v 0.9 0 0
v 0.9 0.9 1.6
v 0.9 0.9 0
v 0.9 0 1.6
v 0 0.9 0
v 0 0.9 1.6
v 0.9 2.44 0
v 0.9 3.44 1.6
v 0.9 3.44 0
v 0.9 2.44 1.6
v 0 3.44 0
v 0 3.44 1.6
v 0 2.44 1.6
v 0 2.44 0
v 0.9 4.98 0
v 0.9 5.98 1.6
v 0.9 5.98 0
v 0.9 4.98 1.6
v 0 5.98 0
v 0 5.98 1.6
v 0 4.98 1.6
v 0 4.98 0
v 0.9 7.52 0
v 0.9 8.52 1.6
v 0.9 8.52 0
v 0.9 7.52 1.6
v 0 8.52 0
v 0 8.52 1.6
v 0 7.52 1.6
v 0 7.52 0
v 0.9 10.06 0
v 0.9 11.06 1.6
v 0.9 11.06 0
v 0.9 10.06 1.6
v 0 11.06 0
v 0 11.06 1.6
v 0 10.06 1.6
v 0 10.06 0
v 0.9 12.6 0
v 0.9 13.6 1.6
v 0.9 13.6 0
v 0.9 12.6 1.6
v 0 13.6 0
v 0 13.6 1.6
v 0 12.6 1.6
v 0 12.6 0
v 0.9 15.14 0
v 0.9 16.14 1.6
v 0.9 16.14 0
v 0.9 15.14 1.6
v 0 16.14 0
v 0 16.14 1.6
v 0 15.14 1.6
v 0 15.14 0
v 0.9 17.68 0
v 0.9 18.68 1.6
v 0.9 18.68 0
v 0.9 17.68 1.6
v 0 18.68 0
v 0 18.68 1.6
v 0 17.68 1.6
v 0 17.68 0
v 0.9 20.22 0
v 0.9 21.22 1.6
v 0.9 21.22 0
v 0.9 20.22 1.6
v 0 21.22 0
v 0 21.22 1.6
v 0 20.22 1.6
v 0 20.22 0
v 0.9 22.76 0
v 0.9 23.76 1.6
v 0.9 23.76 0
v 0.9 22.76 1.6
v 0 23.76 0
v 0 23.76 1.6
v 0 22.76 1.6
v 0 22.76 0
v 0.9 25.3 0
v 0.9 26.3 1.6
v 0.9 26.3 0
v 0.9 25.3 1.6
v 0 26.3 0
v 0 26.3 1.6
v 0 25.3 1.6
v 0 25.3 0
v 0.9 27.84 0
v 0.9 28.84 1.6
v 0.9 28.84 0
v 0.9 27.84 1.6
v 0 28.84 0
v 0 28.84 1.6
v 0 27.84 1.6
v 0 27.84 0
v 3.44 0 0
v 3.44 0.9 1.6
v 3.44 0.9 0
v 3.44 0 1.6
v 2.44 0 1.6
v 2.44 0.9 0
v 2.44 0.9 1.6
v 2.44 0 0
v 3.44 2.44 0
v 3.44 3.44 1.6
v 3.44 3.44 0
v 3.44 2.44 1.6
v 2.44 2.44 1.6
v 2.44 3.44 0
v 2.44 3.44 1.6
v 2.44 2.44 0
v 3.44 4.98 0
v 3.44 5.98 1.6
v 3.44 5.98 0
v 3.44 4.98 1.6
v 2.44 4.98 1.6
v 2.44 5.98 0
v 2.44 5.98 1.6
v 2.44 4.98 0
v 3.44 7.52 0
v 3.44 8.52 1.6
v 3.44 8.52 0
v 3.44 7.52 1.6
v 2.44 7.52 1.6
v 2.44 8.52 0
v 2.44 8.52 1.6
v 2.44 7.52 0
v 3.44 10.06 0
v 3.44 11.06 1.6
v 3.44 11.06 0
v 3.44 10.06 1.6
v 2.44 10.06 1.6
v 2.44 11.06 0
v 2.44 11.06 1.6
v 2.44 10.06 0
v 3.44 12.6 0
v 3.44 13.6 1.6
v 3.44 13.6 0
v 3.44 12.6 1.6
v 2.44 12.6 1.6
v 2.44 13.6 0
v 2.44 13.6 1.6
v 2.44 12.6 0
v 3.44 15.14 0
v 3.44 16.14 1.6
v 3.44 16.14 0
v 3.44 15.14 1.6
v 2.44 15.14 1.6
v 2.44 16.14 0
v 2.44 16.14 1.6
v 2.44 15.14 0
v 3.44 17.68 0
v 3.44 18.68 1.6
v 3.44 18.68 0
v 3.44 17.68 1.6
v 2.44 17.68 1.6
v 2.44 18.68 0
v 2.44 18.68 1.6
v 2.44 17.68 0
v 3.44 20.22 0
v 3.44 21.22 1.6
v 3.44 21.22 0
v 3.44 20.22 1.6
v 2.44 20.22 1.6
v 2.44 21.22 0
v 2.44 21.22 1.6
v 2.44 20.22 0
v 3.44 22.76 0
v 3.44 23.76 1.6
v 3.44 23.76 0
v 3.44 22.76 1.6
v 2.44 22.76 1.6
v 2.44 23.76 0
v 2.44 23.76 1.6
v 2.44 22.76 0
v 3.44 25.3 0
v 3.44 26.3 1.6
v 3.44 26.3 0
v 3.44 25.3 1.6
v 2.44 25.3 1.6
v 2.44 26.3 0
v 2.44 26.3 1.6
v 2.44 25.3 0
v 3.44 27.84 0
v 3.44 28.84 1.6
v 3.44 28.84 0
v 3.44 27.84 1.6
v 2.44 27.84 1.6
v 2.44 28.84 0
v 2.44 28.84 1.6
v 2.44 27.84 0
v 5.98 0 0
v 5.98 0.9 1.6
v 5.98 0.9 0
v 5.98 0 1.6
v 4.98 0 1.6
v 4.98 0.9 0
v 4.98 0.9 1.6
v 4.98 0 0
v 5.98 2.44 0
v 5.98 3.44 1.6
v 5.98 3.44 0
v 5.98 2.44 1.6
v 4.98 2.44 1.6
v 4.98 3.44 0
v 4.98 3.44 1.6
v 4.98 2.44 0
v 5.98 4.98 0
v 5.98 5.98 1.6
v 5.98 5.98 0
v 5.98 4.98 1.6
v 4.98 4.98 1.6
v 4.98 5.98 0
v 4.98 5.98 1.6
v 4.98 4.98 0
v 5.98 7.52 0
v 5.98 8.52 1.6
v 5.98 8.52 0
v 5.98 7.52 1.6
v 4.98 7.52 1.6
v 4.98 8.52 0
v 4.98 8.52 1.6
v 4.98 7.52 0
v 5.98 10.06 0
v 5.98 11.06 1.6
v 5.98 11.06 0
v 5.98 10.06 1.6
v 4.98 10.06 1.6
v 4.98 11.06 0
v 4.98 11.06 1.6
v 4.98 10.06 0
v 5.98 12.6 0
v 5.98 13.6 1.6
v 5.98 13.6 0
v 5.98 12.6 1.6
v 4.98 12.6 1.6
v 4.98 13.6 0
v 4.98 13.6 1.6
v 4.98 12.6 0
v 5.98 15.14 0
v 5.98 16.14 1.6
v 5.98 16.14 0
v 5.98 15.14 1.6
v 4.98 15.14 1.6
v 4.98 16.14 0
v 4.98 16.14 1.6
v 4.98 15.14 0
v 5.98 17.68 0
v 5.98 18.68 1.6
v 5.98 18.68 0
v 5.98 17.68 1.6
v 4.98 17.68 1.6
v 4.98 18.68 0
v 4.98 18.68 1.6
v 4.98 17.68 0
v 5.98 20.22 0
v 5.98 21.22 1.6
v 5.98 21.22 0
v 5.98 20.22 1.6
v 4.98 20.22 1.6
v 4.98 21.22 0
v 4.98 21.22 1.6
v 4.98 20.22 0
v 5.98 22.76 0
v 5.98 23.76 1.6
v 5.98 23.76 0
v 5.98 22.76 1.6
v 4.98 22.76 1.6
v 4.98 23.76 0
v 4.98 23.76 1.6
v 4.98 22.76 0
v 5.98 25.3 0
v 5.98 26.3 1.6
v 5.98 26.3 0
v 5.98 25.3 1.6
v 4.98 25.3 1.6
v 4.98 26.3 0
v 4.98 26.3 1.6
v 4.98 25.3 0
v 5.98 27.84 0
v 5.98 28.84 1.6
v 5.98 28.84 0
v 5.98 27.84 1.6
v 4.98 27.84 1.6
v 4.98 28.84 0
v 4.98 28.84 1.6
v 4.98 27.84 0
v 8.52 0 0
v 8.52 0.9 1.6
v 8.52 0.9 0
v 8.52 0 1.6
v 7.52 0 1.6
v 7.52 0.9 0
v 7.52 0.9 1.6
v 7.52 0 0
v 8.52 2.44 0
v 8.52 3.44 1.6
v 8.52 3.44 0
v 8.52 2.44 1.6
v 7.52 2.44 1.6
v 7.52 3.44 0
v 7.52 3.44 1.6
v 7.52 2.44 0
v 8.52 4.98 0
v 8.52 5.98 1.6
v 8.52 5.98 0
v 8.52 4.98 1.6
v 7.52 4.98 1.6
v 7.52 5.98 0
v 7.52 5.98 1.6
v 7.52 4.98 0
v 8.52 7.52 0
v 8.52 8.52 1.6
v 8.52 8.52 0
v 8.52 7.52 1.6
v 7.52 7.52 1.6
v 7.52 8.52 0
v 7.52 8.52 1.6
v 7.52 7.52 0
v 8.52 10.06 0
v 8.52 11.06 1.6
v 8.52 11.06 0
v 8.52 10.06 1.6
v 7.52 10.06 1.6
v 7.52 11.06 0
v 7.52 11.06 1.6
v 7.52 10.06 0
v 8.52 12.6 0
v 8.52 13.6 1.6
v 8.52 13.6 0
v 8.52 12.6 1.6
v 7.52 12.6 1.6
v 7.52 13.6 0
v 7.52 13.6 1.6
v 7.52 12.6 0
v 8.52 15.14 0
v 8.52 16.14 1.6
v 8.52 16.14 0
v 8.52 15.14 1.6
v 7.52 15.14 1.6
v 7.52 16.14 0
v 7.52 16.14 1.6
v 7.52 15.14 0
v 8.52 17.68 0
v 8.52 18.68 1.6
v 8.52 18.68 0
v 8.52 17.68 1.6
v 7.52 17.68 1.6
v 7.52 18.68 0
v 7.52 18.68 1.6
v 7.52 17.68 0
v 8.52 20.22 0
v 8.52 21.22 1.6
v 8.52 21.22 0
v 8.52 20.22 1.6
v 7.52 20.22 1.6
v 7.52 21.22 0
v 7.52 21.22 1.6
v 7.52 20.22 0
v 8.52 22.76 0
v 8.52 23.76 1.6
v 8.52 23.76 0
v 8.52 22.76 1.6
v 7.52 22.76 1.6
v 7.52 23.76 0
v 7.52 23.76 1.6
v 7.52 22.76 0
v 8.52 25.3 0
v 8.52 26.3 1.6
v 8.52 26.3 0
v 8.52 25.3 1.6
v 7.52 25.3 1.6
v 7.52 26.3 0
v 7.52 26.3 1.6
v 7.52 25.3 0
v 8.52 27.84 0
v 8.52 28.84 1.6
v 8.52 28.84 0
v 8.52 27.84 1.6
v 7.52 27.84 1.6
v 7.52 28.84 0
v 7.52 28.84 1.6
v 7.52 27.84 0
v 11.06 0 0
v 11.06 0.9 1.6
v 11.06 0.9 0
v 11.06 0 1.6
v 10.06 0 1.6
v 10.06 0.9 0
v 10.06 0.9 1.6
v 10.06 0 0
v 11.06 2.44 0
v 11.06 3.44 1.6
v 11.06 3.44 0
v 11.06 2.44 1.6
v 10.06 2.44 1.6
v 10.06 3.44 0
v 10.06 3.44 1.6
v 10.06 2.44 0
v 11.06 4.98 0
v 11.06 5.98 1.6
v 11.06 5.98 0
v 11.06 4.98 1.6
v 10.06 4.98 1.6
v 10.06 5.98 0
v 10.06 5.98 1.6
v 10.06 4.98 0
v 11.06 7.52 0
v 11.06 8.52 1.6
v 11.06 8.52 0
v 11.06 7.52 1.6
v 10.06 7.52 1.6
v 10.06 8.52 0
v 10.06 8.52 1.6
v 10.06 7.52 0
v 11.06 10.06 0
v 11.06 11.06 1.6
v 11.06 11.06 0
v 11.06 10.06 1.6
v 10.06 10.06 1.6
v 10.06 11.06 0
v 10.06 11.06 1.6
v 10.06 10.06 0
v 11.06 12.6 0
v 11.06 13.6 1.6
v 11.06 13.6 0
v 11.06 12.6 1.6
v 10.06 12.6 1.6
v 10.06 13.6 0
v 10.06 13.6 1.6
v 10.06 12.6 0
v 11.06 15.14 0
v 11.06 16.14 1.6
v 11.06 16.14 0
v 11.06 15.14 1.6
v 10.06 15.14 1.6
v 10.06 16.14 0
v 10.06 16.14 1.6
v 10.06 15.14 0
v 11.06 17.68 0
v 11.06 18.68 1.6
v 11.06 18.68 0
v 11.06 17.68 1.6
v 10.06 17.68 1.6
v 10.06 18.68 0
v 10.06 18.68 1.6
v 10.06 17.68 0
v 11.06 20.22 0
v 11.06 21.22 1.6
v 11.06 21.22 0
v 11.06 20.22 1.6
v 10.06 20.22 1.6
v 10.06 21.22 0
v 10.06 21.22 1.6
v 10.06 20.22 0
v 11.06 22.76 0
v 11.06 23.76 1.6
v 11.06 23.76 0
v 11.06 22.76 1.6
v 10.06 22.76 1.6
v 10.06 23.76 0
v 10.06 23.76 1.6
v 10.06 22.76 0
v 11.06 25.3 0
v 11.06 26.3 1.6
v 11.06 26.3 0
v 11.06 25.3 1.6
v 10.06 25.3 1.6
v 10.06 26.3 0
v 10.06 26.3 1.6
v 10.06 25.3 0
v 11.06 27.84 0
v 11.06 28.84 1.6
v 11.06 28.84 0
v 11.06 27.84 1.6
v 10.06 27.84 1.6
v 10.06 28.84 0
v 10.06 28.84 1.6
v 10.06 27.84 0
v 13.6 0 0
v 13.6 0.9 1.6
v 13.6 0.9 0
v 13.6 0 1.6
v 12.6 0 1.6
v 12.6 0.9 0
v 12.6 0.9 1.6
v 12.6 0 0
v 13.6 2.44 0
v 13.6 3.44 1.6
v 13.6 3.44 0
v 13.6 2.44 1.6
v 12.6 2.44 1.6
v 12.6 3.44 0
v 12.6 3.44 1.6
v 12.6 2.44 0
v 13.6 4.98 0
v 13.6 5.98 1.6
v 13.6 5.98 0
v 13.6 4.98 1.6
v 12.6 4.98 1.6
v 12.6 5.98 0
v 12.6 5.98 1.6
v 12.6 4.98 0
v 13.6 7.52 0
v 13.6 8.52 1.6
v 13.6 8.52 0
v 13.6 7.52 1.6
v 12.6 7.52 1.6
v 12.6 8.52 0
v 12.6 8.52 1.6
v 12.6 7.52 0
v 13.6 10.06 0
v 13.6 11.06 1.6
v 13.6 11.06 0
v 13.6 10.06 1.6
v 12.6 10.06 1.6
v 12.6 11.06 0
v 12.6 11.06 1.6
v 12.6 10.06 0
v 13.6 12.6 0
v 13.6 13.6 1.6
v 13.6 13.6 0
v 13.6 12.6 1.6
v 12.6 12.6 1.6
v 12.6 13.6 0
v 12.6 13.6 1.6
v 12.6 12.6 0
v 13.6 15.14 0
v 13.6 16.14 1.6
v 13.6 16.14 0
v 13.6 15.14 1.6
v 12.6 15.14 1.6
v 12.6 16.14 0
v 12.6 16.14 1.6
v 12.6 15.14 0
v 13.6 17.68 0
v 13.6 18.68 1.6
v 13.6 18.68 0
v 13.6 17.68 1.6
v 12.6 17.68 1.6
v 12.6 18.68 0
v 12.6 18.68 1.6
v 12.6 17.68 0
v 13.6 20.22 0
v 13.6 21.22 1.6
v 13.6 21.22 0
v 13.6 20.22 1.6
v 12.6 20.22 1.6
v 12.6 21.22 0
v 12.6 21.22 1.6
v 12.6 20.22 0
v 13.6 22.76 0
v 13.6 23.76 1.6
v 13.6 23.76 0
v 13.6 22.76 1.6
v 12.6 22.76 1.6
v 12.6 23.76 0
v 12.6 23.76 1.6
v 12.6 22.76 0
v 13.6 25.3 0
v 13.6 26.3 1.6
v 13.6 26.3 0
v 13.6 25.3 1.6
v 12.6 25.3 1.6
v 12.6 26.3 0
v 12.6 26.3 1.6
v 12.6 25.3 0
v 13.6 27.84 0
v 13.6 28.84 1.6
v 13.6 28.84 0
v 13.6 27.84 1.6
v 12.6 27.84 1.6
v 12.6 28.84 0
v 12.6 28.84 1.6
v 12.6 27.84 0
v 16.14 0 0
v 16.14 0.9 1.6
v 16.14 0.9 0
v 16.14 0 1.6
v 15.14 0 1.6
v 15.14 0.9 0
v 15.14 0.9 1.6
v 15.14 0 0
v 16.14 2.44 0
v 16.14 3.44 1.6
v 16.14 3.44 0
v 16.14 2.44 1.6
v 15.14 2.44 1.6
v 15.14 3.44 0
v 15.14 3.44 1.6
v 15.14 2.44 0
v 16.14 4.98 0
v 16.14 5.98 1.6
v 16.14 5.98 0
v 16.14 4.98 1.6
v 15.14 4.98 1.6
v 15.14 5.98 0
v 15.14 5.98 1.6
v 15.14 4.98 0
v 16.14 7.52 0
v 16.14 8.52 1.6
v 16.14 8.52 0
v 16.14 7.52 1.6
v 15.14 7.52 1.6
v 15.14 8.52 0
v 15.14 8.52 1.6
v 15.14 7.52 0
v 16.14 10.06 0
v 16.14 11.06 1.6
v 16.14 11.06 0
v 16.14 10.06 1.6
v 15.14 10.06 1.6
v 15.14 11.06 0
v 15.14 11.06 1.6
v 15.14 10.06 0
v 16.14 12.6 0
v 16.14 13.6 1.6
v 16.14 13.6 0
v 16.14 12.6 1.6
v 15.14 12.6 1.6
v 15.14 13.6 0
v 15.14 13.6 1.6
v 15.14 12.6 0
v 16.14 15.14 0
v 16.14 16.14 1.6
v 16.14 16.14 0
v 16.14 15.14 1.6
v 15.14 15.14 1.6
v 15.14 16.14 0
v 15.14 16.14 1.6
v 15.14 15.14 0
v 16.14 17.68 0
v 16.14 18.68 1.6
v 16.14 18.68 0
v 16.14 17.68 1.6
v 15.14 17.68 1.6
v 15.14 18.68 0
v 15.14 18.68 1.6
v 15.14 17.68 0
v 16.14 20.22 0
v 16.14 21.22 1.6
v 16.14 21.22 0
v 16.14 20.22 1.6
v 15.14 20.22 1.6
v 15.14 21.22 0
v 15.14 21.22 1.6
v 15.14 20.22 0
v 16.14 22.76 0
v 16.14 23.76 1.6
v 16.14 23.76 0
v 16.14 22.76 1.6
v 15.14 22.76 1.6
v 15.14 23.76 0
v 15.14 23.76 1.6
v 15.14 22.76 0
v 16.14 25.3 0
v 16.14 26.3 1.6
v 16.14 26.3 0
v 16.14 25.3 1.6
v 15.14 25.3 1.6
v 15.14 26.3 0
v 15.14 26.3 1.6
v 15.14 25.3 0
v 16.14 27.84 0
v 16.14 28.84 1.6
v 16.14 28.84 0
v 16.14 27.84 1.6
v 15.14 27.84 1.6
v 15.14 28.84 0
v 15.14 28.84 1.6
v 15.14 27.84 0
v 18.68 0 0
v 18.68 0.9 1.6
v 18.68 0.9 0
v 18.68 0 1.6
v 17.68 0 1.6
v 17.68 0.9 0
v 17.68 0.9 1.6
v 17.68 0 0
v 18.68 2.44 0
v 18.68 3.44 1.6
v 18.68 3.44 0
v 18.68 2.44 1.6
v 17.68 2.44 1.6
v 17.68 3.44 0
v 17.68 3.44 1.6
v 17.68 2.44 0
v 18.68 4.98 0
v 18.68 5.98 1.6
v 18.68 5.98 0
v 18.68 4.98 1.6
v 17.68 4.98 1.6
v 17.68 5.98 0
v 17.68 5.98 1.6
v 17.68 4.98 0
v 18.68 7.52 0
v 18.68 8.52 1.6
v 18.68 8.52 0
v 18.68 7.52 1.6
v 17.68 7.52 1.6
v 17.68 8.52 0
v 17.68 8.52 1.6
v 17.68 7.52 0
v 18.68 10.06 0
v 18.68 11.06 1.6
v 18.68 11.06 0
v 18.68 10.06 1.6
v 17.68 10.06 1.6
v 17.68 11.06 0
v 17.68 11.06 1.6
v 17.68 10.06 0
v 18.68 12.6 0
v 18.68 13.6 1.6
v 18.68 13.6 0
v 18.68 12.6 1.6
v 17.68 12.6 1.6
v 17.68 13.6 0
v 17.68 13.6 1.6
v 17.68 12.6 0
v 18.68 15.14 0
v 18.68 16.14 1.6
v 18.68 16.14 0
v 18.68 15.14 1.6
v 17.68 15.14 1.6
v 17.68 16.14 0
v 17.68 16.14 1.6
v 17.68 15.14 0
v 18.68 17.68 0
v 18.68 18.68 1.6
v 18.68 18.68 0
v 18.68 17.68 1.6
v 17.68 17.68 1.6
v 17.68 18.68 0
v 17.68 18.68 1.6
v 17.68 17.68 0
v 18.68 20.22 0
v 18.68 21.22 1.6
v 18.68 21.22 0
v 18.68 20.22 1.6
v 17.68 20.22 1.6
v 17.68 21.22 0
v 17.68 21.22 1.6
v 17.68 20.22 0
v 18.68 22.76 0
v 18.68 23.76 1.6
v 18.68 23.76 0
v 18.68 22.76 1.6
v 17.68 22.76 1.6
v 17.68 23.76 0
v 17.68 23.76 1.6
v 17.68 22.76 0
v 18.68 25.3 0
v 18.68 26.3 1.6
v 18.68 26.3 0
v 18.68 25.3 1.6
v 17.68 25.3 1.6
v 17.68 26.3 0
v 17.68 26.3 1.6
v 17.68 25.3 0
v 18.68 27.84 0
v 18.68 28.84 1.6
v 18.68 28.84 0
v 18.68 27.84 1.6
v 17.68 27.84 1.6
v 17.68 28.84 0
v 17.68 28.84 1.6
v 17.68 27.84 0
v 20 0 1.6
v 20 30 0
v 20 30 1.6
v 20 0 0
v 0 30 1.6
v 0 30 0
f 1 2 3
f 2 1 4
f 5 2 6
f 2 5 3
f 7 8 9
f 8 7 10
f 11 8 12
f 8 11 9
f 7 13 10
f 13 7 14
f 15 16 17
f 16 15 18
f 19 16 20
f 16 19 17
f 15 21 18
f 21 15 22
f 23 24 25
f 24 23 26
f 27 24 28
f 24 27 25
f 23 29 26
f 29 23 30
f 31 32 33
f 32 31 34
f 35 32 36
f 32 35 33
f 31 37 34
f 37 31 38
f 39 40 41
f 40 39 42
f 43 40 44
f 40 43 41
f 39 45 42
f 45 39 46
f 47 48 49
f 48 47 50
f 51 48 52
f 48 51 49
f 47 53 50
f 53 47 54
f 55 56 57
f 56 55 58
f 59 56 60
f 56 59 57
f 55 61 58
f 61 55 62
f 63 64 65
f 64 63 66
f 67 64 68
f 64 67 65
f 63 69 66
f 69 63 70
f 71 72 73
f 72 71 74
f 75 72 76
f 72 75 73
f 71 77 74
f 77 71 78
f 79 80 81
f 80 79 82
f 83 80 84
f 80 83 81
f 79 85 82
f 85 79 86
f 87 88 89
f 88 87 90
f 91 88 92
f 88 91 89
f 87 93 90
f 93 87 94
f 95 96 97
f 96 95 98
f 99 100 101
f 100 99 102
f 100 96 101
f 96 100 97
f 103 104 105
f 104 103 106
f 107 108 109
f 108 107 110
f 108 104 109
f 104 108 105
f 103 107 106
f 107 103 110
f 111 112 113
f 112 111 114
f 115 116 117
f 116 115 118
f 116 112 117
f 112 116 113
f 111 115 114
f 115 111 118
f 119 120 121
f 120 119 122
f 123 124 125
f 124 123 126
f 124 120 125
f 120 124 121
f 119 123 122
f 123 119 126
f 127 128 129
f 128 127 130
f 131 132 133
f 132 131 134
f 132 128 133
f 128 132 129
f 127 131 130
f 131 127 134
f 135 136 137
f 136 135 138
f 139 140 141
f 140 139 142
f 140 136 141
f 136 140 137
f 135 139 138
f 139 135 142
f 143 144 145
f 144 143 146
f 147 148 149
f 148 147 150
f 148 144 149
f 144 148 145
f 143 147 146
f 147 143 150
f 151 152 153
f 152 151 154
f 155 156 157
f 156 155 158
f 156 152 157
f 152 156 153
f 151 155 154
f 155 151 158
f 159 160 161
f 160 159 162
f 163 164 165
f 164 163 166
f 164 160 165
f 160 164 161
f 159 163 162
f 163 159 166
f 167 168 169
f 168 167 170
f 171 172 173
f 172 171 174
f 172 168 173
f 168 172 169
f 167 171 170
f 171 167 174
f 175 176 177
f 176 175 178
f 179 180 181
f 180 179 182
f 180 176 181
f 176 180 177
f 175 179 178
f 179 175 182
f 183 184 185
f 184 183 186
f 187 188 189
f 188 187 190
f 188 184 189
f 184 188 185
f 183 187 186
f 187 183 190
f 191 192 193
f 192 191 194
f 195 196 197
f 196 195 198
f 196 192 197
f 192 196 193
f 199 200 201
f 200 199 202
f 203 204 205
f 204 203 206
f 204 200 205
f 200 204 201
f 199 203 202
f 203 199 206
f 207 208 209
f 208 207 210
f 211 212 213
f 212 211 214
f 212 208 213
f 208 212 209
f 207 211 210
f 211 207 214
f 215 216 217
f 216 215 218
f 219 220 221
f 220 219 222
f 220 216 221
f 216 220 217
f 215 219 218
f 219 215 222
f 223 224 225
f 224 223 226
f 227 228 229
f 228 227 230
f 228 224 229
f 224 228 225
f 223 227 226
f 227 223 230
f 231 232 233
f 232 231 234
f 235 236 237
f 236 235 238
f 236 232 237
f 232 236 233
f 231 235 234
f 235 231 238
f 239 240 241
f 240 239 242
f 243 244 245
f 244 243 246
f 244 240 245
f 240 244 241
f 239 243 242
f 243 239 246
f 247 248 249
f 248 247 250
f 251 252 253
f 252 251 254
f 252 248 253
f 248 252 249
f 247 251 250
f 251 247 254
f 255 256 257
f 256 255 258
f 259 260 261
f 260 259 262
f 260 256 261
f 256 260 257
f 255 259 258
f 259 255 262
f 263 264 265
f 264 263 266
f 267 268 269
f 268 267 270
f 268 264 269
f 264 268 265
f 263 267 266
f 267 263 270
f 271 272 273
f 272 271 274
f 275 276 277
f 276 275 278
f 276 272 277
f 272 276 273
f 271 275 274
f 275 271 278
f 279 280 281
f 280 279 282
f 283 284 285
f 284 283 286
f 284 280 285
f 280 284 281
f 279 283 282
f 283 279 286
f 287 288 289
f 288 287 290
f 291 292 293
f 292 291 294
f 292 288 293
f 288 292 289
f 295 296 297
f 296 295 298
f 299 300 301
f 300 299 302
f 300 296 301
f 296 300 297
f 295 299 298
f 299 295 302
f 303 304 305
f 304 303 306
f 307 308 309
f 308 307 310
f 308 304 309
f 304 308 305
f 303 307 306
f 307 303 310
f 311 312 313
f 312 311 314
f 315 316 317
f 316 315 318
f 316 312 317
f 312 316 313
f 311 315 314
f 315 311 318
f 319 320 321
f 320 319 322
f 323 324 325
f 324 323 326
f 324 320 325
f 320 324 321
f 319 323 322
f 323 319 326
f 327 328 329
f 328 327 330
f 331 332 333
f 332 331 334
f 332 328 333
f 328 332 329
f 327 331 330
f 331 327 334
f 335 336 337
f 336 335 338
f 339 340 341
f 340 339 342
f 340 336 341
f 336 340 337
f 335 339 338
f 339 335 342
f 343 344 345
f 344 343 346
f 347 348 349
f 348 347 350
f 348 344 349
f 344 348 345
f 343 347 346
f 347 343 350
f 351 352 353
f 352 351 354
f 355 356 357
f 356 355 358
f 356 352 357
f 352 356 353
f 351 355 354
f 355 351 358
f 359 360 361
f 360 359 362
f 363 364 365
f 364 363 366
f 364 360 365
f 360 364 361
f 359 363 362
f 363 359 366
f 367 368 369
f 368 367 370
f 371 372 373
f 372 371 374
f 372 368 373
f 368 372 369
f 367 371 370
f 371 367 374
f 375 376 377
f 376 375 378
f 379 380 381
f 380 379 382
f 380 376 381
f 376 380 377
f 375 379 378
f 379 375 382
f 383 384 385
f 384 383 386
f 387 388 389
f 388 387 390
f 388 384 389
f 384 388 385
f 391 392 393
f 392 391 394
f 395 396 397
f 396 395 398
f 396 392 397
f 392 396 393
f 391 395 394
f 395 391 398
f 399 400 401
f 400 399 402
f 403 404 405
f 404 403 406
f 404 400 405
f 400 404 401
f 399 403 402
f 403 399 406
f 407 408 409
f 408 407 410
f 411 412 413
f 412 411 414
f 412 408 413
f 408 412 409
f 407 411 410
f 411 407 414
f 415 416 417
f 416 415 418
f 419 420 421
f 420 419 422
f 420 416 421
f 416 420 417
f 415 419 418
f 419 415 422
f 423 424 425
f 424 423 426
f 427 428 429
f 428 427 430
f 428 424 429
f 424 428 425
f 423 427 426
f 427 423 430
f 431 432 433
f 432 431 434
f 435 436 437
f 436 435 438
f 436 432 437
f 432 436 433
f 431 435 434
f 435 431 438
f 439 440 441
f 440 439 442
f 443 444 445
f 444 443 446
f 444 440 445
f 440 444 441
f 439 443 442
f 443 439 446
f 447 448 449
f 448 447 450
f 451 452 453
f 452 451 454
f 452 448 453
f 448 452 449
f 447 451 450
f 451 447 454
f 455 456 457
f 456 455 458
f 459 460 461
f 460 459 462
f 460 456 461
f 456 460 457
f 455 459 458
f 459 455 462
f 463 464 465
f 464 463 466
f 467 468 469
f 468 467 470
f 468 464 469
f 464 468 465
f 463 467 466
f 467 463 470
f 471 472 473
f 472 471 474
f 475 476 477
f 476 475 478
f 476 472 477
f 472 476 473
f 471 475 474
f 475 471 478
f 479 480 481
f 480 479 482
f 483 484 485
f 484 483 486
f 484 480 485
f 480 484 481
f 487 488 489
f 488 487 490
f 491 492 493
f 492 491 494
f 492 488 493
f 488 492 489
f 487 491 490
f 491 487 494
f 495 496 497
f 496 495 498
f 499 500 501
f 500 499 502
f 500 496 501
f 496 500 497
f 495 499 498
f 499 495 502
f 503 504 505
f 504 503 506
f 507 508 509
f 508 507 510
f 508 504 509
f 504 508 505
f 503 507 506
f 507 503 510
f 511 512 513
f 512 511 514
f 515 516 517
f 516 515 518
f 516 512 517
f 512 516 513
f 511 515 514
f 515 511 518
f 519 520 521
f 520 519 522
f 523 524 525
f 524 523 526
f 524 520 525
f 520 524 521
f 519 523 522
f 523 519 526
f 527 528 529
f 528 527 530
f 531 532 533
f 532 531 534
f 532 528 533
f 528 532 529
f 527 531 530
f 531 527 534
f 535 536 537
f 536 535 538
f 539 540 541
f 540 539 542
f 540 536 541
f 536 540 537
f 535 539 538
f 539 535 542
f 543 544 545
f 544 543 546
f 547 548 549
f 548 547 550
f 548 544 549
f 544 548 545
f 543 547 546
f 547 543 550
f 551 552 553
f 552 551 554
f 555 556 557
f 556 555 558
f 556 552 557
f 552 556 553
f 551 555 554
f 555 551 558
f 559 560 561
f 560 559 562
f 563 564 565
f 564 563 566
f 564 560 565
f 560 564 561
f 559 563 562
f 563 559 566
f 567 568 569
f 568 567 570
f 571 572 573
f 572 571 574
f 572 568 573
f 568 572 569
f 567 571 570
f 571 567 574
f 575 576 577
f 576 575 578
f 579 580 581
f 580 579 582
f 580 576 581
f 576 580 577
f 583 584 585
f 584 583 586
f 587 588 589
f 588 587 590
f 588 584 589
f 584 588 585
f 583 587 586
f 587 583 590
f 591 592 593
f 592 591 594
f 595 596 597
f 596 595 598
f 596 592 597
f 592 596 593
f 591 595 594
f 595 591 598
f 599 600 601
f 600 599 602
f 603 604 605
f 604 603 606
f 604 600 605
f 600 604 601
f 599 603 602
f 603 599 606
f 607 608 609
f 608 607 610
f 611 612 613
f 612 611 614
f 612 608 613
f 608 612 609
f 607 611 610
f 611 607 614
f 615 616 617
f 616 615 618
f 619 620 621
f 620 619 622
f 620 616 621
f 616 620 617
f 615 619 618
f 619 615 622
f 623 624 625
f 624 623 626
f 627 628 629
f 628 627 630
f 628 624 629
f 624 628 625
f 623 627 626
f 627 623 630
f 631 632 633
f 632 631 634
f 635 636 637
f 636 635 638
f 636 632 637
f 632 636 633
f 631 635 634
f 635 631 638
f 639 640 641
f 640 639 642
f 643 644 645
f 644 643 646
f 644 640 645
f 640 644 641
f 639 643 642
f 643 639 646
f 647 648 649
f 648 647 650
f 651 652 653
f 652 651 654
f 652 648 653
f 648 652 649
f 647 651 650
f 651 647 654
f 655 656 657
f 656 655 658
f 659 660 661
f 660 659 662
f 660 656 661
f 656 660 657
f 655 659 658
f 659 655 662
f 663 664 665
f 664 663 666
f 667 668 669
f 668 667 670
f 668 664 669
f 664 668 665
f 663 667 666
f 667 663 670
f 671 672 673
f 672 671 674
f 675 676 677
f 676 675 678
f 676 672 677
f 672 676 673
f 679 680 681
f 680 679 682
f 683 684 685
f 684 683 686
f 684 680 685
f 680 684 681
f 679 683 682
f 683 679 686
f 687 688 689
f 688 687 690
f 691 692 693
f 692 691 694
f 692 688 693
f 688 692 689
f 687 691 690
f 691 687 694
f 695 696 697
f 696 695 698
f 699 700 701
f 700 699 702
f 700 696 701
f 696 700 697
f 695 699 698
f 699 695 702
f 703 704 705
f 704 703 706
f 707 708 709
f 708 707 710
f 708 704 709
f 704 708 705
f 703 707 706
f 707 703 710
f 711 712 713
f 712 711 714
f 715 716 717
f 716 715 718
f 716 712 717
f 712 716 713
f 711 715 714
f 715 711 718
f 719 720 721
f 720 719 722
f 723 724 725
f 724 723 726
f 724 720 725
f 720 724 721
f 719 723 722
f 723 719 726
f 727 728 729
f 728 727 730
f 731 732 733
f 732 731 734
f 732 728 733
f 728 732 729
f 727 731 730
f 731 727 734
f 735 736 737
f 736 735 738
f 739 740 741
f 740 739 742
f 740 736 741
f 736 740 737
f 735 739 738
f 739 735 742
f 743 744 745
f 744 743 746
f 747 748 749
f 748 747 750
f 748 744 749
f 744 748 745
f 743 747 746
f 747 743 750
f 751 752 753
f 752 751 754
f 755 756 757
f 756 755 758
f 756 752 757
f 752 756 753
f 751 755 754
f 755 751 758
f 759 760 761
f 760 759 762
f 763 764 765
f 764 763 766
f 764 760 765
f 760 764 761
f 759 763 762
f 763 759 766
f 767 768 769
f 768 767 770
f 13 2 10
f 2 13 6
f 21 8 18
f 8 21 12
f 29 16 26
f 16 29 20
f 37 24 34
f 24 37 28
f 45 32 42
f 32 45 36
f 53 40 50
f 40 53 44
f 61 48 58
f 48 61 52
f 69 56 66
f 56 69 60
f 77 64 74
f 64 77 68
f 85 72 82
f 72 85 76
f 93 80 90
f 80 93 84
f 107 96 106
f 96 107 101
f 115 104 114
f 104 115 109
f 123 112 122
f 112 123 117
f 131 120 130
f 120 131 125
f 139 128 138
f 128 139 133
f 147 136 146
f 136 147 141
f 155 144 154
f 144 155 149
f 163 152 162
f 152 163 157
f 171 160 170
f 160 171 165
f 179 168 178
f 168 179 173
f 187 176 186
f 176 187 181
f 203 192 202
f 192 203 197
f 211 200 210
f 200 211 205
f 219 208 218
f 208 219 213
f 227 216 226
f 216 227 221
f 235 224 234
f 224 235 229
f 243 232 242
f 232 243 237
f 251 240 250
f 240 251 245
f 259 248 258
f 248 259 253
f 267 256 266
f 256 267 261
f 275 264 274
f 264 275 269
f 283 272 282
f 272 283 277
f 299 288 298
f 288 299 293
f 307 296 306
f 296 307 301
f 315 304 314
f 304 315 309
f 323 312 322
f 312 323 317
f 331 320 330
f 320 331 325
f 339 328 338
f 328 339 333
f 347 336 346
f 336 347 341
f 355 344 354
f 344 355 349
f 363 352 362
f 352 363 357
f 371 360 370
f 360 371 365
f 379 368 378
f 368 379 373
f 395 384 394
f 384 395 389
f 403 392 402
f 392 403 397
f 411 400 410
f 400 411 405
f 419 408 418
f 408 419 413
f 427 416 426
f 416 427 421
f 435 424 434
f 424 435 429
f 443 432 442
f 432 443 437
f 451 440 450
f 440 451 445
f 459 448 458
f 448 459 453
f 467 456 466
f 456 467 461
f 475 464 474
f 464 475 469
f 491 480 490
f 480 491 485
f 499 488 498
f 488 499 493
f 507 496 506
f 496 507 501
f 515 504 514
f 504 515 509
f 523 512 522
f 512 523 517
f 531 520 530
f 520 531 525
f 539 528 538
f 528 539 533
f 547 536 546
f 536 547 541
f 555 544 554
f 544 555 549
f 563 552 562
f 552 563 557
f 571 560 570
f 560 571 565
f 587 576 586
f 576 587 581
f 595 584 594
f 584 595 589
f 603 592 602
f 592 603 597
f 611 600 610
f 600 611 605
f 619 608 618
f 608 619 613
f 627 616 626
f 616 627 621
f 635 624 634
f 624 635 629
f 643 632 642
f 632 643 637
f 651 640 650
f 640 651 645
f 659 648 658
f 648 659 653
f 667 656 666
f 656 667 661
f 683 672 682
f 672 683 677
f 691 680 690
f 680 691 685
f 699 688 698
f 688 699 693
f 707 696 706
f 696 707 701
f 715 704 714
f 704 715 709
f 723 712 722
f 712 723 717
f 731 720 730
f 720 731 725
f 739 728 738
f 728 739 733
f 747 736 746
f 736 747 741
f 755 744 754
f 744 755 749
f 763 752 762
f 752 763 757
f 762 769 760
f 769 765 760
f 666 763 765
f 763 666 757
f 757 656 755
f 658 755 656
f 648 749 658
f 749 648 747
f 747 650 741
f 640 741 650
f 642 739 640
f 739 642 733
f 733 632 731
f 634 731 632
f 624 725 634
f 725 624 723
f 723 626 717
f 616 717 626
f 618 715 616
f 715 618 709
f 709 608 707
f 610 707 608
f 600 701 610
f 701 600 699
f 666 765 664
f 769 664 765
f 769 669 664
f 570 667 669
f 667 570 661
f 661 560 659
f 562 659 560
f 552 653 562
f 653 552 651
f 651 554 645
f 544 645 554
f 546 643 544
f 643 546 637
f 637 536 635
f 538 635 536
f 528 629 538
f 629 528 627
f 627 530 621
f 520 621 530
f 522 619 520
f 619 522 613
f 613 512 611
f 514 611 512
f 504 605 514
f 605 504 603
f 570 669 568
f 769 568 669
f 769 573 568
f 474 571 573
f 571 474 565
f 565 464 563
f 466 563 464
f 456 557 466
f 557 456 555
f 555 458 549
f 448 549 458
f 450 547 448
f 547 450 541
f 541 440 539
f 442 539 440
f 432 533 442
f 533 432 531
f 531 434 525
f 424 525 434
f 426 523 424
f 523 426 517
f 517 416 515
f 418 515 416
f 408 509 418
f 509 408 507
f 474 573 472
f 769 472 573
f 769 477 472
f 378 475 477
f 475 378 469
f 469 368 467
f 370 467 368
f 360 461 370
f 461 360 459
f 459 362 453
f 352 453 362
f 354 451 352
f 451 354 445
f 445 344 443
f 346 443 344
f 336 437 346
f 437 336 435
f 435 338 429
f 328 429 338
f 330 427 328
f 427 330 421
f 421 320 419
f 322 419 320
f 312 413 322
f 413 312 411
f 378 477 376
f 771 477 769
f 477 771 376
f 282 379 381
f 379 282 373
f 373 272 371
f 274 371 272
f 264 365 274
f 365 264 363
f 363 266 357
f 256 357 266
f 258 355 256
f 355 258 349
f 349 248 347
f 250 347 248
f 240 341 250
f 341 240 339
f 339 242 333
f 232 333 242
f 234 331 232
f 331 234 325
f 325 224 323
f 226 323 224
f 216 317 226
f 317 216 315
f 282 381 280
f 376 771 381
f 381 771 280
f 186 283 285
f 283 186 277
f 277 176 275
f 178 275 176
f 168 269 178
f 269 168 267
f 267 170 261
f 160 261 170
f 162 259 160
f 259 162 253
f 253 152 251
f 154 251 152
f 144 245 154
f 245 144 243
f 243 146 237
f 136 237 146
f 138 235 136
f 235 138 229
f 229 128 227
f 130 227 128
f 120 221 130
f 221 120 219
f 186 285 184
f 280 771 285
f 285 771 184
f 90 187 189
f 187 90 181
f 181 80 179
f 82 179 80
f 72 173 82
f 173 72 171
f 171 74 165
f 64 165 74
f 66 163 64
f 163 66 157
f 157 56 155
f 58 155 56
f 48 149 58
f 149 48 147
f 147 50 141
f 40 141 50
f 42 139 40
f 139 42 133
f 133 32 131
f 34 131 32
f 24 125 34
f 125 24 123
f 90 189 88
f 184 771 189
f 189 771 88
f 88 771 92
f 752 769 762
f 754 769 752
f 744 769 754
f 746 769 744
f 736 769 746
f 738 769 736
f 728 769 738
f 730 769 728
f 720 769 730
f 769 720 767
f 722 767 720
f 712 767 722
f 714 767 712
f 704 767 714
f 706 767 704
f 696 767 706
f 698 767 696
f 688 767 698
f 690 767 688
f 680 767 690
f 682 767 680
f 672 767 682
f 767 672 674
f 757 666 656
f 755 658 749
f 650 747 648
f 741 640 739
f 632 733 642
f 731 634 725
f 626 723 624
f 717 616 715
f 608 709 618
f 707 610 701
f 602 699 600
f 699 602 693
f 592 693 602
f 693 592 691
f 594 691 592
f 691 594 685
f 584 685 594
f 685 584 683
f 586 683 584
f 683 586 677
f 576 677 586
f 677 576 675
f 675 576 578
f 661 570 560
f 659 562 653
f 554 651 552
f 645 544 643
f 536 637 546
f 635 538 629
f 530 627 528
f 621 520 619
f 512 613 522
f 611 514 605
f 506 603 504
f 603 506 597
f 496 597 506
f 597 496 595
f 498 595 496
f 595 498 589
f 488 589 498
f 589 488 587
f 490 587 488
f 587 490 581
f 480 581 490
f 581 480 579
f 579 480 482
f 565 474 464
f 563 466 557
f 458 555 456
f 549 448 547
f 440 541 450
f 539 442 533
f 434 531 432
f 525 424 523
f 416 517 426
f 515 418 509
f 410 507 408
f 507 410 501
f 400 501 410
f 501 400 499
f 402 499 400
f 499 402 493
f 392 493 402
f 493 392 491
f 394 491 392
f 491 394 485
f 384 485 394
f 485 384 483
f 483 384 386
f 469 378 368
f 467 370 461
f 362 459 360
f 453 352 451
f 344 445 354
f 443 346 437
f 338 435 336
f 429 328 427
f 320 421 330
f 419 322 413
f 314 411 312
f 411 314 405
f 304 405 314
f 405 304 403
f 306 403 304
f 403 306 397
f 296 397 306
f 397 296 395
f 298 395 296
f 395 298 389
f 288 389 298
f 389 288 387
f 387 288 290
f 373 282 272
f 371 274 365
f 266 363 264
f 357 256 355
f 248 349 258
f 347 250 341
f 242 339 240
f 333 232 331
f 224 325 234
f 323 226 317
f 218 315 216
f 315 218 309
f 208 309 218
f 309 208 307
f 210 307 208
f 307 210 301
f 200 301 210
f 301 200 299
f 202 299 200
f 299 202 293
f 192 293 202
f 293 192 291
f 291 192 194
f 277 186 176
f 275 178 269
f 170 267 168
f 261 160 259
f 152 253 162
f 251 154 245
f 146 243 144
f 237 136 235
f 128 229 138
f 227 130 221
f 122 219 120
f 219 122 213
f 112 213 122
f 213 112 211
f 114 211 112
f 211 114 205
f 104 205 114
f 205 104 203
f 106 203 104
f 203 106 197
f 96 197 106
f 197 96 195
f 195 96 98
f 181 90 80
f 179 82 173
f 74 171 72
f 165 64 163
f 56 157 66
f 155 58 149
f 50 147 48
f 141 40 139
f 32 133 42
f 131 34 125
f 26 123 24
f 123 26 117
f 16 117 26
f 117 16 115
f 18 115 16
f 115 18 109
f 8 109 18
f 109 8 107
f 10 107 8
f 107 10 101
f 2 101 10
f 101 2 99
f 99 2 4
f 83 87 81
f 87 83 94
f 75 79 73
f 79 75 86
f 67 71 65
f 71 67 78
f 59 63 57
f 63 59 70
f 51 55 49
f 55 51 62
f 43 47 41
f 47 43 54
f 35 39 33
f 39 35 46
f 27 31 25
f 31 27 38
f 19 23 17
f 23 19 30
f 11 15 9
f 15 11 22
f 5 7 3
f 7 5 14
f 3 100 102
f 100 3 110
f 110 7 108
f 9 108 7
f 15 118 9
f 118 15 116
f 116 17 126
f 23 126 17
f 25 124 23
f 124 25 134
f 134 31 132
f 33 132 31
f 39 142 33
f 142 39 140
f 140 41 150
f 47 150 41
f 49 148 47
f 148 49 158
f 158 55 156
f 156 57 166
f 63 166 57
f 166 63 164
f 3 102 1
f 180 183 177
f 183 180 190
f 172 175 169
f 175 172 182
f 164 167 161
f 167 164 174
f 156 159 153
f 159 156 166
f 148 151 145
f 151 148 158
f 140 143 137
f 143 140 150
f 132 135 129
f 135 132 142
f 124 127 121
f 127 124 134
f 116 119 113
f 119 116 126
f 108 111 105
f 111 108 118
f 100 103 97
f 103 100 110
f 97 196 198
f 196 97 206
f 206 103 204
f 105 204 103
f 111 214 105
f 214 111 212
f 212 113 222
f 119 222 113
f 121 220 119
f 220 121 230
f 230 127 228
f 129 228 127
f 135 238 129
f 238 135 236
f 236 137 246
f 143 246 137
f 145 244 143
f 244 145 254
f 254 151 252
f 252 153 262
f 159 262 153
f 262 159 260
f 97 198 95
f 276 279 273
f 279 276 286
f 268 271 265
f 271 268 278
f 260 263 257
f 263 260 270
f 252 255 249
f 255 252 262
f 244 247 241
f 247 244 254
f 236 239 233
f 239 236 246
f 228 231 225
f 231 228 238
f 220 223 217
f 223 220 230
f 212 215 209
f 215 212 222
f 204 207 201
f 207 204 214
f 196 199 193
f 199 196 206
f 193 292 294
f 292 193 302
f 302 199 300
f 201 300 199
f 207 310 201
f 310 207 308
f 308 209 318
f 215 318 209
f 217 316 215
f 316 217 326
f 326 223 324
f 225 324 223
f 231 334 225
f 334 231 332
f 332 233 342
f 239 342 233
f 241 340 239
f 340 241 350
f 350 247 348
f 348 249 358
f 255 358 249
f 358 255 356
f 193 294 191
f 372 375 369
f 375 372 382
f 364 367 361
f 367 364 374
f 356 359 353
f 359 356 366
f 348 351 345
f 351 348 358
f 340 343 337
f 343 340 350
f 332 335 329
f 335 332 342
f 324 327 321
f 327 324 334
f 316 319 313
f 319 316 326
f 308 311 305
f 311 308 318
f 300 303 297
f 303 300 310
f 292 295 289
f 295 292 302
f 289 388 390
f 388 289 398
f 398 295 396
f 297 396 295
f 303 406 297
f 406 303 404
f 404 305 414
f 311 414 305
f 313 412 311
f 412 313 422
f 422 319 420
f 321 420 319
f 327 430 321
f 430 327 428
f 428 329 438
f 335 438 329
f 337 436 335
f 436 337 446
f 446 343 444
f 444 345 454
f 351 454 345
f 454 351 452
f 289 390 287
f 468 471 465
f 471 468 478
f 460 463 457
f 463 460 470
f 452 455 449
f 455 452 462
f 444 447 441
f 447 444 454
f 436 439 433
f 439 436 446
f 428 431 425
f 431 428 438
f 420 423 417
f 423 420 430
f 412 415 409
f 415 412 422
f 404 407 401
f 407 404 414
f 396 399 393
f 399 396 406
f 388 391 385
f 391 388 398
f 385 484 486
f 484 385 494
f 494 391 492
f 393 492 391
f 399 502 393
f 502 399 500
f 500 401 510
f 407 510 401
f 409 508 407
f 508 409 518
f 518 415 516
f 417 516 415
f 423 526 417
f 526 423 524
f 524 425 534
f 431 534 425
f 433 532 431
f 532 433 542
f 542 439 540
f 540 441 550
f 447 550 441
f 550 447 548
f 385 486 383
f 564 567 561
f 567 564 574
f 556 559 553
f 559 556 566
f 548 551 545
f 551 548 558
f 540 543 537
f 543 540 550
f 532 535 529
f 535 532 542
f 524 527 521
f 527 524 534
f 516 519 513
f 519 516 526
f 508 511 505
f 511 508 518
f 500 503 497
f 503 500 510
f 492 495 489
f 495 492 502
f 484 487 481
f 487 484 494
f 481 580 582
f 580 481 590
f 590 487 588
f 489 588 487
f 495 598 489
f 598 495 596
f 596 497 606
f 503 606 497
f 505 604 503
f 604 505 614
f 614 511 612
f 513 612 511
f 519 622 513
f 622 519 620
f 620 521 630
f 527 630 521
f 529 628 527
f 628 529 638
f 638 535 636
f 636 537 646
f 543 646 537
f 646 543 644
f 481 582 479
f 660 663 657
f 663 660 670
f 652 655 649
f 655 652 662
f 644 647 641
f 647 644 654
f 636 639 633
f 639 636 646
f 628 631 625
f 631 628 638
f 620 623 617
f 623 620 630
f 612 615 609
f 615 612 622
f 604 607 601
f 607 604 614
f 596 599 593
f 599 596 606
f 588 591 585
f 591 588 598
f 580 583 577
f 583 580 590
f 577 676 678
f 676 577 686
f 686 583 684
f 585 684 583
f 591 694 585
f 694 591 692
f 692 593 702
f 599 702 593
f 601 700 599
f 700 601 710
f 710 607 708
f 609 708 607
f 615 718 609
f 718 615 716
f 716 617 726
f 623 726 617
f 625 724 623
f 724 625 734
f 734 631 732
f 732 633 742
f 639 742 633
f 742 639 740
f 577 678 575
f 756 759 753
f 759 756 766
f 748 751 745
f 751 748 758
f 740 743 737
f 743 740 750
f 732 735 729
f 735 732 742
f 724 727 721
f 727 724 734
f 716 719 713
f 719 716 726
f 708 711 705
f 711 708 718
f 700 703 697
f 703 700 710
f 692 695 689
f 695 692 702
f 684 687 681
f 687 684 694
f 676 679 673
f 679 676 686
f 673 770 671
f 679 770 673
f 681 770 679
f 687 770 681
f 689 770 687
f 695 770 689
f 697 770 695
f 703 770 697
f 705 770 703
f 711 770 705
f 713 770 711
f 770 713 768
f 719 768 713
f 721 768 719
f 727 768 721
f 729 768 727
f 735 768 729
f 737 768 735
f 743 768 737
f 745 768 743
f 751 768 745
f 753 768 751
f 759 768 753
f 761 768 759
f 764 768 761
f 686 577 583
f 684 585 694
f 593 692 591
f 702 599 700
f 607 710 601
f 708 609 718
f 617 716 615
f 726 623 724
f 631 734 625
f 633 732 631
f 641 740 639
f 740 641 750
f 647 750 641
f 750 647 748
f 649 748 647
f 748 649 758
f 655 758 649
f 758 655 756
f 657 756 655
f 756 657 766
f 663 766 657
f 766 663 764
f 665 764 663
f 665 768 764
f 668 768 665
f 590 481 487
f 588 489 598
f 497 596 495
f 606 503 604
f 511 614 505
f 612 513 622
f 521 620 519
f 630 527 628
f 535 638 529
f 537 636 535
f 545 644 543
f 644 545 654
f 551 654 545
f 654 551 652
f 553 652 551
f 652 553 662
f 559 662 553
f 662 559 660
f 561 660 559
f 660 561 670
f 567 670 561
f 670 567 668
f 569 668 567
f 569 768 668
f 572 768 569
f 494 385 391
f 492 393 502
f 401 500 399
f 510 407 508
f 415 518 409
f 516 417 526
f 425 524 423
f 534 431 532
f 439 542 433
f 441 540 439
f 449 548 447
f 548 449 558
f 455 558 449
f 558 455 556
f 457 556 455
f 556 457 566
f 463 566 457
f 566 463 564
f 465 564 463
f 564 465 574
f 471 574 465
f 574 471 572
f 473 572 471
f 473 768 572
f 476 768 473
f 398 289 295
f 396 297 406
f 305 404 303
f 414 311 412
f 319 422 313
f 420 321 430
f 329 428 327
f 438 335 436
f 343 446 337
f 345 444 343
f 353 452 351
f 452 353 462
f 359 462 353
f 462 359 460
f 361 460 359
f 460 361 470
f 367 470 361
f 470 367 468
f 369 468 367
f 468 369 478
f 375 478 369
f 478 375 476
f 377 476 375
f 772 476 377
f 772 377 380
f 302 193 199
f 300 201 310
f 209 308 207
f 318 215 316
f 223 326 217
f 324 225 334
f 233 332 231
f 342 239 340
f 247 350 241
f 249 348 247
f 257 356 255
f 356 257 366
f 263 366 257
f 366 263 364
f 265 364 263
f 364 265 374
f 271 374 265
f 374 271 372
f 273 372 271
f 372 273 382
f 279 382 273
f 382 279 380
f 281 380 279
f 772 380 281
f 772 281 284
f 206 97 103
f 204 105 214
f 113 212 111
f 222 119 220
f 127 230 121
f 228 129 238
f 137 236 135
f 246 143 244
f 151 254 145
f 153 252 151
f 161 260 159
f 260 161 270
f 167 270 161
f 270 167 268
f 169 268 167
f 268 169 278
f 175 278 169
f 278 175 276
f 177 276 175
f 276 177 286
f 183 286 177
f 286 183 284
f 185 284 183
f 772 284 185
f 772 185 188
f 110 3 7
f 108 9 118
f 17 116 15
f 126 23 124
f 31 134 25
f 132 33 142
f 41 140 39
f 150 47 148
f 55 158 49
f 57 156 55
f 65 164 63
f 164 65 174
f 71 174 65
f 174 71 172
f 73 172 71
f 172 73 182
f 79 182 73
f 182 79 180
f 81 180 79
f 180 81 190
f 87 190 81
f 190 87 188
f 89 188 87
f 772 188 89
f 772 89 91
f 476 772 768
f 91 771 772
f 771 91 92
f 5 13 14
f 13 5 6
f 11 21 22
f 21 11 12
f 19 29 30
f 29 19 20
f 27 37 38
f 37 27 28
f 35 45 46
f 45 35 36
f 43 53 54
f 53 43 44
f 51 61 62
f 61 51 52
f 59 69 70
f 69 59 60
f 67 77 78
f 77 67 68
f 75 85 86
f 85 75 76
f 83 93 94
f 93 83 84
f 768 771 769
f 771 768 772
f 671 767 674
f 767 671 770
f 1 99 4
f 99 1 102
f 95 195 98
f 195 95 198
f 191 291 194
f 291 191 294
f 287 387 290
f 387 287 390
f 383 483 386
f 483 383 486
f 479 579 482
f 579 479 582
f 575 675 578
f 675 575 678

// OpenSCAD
x=20;
y=30;
millefori(x,y);

module millefori(x,y) {
	mill=2.54;
	spessore=1.6;
	x=x/2.54;
	y=y/2.54;
difference() {
	cube ([x*mill,y*mill,spessore]);	
	for (x=[0:1:x], y=[0:1:y]) translate([x*mill-.1,y*mill-.1,-.1]) color("gold") 
	cube([1,1,spessore+.2]);
//		cylinder(h=spessore+.2,d=1,$fn=3);
	}
}
//millefori
